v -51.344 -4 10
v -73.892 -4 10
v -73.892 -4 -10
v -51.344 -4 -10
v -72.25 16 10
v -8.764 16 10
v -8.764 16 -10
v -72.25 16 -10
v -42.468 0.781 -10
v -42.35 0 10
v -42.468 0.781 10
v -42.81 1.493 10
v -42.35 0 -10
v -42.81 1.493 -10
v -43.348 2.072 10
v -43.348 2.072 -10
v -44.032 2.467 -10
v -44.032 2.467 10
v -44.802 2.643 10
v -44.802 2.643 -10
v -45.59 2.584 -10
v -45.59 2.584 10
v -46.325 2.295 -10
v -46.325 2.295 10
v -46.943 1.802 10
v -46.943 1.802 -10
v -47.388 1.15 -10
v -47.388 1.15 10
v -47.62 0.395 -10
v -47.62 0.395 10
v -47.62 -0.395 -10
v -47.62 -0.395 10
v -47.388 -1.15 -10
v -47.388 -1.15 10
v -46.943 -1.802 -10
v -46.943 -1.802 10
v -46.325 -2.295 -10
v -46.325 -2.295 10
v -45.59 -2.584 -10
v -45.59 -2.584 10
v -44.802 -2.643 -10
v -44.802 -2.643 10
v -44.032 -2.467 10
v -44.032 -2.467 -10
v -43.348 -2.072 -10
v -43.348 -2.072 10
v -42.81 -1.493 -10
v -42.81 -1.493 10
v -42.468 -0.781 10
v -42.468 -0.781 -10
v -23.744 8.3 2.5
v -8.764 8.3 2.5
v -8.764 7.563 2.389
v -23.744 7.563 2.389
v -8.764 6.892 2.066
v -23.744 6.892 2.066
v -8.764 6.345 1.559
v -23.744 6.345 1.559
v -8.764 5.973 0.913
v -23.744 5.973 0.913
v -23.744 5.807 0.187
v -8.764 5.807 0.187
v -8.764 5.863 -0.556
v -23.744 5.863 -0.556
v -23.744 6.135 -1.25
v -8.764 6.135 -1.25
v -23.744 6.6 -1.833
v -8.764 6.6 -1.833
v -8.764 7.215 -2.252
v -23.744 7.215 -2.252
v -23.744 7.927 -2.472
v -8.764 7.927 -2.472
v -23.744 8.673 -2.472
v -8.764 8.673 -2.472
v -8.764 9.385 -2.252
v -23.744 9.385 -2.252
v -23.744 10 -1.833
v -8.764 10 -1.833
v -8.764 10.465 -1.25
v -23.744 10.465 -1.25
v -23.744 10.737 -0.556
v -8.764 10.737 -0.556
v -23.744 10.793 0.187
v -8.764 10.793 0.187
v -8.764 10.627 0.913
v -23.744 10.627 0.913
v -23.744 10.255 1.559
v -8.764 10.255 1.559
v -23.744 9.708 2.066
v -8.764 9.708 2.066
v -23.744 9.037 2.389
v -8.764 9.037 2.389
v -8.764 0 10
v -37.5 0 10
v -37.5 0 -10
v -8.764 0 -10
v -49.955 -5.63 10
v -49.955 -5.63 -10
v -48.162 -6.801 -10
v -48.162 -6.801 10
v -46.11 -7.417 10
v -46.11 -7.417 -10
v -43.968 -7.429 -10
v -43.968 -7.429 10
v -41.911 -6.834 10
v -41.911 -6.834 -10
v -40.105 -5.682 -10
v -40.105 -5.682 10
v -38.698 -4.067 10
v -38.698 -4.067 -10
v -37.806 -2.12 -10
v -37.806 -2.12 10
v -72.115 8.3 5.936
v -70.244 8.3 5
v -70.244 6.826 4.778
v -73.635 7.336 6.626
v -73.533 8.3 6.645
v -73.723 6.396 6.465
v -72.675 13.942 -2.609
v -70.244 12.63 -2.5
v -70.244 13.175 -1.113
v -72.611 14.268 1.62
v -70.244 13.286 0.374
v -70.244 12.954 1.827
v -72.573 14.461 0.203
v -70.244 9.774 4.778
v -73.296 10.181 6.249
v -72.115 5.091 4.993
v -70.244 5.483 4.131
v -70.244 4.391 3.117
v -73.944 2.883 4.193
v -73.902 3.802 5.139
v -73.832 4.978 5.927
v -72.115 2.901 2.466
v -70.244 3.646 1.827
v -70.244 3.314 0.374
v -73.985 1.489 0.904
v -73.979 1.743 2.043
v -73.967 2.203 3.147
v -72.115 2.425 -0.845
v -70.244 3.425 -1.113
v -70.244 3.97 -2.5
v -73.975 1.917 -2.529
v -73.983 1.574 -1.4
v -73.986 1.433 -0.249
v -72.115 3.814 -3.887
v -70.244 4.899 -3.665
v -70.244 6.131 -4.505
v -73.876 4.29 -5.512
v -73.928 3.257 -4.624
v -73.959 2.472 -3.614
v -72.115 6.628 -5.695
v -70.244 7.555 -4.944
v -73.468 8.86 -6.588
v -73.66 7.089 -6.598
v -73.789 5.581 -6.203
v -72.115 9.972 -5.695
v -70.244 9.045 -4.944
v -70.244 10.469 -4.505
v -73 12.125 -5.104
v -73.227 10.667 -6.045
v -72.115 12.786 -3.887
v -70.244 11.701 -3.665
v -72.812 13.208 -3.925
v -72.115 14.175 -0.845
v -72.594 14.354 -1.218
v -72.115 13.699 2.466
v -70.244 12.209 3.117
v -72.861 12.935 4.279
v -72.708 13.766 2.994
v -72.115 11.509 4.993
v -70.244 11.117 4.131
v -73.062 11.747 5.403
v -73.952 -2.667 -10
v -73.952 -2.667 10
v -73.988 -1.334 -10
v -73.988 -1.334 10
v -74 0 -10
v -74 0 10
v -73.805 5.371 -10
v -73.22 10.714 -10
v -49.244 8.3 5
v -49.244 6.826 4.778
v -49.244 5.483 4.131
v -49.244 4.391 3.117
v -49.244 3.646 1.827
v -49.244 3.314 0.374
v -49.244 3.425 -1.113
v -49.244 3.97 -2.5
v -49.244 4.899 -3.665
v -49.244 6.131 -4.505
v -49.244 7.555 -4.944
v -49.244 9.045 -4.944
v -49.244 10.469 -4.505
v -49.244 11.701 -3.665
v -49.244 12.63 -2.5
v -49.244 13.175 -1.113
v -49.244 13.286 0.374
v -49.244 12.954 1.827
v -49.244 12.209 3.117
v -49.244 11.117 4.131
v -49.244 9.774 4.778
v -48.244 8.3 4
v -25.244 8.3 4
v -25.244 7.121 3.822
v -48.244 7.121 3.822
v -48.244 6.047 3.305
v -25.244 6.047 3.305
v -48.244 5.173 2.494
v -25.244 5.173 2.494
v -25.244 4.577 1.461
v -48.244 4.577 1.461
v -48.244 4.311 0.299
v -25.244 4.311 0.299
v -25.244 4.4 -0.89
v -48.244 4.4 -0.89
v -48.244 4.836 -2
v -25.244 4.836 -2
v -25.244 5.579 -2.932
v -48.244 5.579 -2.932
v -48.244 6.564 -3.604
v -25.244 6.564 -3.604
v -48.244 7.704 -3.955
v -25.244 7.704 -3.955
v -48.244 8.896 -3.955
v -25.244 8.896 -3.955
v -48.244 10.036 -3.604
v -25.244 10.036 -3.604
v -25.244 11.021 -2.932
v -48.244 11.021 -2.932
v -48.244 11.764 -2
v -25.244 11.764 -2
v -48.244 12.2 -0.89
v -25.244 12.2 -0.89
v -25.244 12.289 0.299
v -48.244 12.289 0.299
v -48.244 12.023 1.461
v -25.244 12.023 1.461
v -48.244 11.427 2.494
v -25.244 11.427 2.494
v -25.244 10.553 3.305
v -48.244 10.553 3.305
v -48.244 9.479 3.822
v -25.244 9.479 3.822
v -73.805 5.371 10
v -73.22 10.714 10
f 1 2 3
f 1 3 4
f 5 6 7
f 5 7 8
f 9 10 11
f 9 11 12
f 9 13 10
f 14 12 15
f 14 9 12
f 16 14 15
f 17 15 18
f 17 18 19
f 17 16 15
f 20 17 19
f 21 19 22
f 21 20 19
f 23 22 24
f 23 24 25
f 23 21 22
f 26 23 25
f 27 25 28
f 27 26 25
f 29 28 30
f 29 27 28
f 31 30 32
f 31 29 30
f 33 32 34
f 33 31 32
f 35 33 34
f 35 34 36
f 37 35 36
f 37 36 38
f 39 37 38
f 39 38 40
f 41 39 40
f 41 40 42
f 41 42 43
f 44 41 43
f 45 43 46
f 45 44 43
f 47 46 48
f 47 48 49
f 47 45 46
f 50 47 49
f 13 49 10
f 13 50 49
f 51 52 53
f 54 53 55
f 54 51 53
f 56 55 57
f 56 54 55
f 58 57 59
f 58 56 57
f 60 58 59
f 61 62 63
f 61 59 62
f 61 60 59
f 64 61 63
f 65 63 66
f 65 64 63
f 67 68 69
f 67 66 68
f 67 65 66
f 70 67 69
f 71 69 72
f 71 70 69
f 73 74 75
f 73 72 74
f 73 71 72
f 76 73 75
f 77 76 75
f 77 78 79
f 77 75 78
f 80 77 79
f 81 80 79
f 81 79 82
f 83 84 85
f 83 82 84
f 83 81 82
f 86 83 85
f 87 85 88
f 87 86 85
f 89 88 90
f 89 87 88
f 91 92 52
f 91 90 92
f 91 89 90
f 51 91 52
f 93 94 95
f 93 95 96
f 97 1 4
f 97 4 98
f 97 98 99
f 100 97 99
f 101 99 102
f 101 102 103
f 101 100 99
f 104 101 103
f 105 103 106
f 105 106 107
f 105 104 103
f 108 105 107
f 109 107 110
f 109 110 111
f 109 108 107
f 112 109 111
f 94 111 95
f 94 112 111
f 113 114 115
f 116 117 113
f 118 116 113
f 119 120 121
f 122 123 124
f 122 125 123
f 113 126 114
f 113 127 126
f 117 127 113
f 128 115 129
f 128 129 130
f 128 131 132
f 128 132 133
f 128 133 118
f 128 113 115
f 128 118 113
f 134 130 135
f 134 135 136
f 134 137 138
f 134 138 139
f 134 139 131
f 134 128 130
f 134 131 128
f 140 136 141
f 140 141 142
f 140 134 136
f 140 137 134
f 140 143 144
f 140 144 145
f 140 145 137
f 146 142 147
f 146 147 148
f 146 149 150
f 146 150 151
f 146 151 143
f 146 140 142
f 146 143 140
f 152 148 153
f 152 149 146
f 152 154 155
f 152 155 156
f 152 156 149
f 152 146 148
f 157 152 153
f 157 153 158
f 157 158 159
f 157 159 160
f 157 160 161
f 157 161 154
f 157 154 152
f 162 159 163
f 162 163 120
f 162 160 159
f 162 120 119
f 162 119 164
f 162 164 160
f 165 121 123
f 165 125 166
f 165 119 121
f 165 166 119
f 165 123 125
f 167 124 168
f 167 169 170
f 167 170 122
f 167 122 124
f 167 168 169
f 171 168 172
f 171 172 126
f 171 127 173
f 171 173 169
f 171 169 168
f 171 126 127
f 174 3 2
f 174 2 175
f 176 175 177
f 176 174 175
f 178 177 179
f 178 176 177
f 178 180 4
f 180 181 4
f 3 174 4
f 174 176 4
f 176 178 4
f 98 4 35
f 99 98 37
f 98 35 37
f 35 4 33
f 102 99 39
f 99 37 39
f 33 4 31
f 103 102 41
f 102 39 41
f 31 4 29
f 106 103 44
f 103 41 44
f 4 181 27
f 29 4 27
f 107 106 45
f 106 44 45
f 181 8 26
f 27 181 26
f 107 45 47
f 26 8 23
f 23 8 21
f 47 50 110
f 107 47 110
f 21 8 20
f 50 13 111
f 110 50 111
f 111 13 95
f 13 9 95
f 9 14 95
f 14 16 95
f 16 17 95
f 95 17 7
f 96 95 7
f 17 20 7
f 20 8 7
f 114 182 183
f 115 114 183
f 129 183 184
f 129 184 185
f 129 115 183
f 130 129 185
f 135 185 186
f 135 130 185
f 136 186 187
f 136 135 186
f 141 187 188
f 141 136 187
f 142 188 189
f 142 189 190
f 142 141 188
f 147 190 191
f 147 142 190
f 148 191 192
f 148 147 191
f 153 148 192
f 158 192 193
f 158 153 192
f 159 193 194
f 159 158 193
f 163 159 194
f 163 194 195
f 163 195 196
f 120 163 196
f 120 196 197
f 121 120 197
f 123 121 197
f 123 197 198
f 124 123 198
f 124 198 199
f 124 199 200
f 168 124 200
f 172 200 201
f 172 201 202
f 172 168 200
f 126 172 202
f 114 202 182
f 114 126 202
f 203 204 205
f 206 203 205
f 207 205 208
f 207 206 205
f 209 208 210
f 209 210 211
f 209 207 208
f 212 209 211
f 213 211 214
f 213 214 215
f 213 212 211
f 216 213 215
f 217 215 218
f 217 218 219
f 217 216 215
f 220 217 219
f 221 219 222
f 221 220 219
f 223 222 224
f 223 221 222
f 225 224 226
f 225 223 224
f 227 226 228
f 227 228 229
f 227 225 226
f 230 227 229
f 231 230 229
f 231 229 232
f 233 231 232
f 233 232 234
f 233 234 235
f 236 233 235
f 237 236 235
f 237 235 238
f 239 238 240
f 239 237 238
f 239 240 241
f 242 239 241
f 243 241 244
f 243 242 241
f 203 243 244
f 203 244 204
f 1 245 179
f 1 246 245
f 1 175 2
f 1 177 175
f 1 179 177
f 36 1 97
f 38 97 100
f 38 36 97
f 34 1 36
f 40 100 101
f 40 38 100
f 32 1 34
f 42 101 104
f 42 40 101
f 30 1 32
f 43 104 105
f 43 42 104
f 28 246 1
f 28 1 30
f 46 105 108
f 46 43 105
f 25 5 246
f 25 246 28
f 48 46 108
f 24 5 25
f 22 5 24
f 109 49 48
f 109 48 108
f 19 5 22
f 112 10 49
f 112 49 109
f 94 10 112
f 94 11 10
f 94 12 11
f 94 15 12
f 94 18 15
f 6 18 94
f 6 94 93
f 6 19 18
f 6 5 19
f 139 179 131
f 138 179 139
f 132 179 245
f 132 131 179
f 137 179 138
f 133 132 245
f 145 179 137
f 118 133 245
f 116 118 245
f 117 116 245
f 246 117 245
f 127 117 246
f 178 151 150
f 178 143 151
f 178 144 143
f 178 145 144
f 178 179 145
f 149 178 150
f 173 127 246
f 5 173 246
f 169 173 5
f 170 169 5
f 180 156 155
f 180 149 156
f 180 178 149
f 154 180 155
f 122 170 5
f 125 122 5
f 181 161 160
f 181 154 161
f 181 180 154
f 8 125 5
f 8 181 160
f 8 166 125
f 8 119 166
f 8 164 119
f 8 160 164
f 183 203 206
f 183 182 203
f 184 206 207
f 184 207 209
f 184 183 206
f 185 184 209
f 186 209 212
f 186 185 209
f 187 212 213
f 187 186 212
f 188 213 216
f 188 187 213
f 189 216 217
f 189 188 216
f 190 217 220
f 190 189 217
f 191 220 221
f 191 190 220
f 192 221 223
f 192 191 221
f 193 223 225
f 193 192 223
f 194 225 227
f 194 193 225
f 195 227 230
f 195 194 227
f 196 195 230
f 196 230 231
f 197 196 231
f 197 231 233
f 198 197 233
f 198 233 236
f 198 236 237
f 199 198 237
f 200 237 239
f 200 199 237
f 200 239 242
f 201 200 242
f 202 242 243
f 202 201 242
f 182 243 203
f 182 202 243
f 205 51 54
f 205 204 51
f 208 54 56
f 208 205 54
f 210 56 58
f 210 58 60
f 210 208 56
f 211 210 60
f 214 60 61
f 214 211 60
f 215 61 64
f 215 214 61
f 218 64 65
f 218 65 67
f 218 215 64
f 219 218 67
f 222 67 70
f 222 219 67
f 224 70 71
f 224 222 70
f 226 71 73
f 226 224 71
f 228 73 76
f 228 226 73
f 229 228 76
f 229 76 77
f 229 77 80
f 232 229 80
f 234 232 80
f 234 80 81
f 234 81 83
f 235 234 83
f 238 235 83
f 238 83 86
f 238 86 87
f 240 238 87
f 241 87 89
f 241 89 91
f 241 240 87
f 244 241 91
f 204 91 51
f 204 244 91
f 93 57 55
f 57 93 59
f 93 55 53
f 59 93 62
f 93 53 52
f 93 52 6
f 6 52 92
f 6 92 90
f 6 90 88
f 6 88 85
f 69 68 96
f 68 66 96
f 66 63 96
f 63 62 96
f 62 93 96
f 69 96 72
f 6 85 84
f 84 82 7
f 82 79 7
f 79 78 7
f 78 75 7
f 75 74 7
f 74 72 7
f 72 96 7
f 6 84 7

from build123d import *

# Parameters (mm, degrees)
SKETCH2_R           = 2.65
BOSS_EXTRUDE1_DEPTH = 10
SKETCH4_R           = 75.7
SKETCH4_R_2         = 74
CUT_EXTRUDE5_DEPTH  = 80.915518032
SKETCH5_W           = 3
SKETCH5_H           = 16
CUT_EXTRUDE6_DEPTH  = 79.307087942


with BuildPart() as part:
    # Sketch2 → Boss-Extrude1 (new, symmetric)
    with BuildSketch(Plane.XY):
        with BuildLine():
            ThreePointArc((-73.989796594, 16), (-75.457580373, 6.053392794), (-75.594245813, -4))
            Line((-75.594245813, -4), (-51.34428877, -4))
            ThreePointArc((-51.34428877, -4), (-42.918193786, -7.205281597), (-37.5, 0))
            Line((-37.5, 0), (-5.763957799, 0))
            Line((-5.763957799, 0), (-5.763957799, 16))
            Line((-5.763957799, 16), (-73.989796594, 16))
        make_face()
        with Locations((-45, 0)):
            Circle(SKETCH2_R, mode=Mode.SUBTRACT)
    extrude(amount=BOSS_EXTRUDE1_DEPTH, both=True)

    # Sketch3 → Cut-Revolve1 (revolve, cut)
    with BuildSketch(Plane.XY, mode=Mode.PRIVATE) as cut_revolve1_sk:
        Polygon((-76.243604379, 8.3), (-75.243604379, 8.3), (-55.276091822, 8.3), (11.256395621, 8.3), (11.256395621, 10.8), (-23.743604379, 10.8), (-25.243604379, 12.3), (-48.243604379, 12.3), (-49.243604379, 13.3), (-70.243604379, 13.3), (-76.243604379, 13.3), align=None)
        Polygon((-76.243604379, 16.3), (-76.243604379, 13.3), (-70.243604379, 13.3), align=None)
    revolve(cut_revolve1_sk.sketch.rotate(Axis((-75.243604379, 8.3, 0), (1, 0, 0)), 90), axis=Axis((-75.243604379, 8.3, 0), (1, 0, 0)), mode=Mode.SUBTRACT)

    # Sketch4 → Cut-Extrude5 (cut, through all)
    with BuildSketch(Plane(origin=(0, 0, -10), x_dir=(-1, 0, 0), z_dir=(0, 0, -1))):
        Circle(SKETCH4_R)
        Circle(SKETCH4_R_2, mode=Mode.SUBTRACT)
    extrude(amount=-CUT_EXTRUDE5_DEPTH, mode=Mode.SUBTRACT)

    # Sketch5 → Cut-Extrude6 (cut, through all)
    with BuildSketch(Plane(origin=(0, 0, -10), x_dir=(-1, 0, 0), z_dir=(0, 0, -1))):
        with Locations((7.263957799, 8)):
            Rectangle(SKETCH5_W, SKETCH5_H)
    extrude(amount=-CUT_EXTRUDE6_DEPTH, mode=Mode.SUBTRACT)


solid = part.part
